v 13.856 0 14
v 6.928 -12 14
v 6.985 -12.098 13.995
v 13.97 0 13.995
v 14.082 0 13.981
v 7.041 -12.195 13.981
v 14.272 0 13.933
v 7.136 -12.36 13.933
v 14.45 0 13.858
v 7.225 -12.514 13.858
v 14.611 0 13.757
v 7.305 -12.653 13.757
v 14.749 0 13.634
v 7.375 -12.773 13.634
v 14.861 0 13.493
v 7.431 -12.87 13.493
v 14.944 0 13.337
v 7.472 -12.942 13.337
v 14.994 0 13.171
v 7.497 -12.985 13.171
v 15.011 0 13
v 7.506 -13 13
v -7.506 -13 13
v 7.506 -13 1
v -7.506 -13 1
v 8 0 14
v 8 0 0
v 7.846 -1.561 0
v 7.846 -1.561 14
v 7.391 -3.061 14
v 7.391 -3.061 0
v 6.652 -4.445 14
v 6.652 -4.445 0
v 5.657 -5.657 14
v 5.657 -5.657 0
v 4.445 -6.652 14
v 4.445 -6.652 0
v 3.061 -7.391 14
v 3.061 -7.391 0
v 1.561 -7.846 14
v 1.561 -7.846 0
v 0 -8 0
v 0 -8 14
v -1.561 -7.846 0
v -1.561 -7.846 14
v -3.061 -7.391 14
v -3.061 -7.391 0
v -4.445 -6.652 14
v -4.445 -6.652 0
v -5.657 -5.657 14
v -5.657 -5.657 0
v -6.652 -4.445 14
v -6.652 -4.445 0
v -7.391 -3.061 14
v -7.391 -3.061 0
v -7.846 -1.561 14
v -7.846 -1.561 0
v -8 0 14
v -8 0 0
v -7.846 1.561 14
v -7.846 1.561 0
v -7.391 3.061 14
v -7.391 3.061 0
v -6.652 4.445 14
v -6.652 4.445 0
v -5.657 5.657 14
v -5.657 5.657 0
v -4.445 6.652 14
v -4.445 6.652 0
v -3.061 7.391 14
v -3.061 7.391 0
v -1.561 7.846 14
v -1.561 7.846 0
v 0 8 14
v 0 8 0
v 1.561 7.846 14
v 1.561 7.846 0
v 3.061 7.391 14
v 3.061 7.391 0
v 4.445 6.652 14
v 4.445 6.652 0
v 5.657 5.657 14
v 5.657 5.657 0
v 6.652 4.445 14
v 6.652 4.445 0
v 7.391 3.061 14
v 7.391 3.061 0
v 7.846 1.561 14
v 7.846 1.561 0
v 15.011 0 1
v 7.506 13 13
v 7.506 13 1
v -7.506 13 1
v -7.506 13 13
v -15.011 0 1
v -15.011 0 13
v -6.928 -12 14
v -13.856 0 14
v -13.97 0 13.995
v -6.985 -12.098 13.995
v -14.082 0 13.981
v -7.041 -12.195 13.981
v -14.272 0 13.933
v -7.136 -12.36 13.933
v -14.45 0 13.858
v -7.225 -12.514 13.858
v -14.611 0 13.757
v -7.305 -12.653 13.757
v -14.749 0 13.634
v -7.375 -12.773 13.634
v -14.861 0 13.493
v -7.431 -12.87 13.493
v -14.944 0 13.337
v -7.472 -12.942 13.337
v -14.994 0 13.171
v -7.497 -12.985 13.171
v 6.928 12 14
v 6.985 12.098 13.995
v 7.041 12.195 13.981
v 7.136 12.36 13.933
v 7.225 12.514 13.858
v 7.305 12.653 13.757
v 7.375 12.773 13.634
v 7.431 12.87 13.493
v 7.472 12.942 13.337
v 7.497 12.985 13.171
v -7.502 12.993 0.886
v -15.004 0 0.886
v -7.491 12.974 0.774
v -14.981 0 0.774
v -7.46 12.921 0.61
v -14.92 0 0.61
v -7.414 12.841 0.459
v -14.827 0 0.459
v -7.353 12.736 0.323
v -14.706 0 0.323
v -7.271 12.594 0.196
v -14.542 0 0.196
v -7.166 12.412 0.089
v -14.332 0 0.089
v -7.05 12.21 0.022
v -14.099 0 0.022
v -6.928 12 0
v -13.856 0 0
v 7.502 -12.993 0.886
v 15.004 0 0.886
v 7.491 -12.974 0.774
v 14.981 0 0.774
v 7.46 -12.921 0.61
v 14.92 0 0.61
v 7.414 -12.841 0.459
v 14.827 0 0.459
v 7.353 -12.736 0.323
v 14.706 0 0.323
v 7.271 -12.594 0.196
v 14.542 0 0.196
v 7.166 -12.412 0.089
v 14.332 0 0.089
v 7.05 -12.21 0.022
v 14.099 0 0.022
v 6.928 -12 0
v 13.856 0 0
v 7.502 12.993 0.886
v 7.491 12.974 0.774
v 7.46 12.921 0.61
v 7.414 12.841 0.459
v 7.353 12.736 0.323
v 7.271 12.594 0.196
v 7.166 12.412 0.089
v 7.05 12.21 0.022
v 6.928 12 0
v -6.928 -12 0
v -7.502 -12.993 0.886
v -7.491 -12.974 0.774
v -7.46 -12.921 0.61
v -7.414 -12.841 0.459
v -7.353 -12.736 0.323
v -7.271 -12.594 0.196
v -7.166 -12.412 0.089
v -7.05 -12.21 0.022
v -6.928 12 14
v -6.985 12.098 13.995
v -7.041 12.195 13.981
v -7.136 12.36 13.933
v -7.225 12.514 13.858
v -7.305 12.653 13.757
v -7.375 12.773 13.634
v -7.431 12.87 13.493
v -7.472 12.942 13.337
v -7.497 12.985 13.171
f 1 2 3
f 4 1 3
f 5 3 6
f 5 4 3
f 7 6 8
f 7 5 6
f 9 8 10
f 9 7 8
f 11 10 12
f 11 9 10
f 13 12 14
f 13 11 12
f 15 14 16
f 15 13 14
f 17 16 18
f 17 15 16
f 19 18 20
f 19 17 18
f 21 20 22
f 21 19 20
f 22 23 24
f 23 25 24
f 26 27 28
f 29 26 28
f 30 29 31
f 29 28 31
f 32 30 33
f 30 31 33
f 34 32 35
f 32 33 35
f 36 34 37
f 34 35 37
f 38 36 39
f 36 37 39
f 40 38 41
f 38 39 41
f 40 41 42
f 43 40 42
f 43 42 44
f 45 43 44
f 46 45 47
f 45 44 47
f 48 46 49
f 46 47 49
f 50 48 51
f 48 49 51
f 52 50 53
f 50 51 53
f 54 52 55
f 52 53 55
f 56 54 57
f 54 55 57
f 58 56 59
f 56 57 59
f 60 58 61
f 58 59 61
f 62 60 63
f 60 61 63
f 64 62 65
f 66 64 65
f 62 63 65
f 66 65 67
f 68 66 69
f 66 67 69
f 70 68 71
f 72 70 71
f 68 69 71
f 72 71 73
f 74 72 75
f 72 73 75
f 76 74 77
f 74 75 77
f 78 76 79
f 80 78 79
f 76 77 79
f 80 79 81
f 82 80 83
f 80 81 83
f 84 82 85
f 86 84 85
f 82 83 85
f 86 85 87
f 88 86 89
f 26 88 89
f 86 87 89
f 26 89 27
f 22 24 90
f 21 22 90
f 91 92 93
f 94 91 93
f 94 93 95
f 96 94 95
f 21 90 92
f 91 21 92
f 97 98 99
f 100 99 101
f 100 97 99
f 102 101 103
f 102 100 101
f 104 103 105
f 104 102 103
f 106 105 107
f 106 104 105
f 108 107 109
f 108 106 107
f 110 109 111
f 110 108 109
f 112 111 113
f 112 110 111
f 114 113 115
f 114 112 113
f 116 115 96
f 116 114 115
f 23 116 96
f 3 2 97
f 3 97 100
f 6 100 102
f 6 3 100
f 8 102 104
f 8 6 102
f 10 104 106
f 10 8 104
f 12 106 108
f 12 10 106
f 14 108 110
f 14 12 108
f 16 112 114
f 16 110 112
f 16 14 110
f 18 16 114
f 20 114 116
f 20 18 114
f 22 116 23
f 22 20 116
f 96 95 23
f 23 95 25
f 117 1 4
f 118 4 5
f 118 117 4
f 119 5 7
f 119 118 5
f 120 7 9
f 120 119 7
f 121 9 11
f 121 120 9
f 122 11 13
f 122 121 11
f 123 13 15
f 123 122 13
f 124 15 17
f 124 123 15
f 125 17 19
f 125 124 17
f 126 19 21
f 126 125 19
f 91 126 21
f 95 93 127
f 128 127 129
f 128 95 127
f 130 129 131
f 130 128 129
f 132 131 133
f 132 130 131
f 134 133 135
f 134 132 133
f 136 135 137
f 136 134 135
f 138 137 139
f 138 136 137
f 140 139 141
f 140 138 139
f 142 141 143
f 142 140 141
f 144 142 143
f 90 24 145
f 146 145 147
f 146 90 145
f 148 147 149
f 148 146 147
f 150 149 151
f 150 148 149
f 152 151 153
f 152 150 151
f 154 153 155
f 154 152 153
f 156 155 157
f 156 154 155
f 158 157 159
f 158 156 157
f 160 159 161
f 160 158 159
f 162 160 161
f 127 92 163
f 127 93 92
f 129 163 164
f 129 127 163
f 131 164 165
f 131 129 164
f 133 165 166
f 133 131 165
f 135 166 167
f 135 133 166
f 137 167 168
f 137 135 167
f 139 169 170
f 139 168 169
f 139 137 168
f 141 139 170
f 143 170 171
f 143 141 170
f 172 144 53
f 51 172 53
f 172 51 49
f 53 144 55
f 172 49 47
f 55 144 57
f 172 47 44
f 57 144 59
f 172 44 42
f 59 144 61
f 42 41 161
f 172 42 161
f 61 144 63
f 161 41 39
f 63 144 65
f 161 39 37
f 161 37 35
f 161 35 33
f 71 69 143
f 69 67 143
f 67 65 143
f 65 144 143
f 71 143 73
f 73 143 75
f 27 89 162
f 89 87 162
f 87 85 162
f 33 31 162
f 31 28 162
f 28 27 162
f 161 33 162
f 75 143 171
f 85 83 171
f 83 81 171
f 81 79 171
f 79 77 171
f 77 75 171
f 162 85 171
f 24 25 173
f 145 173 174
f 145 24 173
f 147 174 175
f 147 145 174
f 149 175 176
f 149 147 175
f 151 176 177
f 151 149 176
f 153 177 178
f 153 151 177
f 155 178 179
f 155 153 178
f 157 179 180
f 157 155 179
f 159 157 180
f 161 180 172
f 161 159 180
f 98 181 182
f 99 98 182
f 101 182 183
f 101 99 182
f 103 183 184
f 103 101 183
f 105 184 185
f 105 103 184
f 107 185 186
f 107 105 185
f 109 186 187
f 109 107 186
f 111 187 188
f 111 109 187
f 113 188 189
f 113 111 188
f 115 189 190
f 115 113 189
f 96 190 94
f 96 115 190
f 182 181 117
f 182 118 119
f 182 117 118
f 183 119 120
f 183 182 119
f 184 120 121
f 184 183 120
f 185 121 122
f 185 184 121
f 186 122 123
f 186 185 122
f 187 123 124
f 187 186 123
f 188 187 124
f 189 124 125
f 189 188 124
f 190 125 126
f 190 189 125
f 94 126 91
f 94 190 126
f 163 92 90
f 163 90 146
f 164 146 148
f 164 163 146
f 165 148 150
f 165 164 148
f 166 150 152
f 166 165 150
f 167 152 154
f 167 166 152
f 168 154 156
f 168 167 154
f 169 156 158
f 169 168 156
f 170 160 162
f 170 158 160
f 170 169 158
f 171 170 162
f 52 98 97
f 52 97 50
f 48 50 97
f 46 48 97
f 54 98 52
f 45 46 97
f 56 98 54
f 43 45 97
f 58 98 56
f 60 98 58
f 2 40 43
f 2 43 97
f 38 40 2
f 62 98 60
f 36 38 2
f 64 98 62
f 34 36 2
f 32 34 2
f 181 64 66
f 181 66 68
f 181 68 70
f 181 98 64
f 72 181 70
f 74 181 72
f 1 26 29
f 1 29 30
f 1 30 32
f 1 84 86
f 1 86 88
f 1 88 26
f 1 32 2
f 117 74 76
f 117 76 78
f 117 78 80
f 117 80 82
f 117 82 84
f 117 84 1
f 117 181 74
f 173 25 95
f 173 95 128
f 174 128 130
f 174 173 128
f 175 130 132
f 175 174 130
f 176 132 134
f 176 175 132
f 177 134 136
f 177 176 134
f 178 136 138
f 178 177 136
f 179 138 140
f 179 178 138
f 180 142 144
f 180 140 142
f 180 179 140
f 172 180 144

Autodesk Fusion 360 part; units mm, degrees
sketch "Sketch1" plane through (0, 0, 0) normal (0, 0, 1) x (1, 0, 0)
  circle A0 centre (0, 0) radius 8
  line L0 (0, 0) -> (0, 8) construction
  line L1 (0, 0) -> (-8, 0) construction
  line L2 (0, 0) -> (8, 0) construction
  line L3 (0, 0) -> (0, -8) construction
  line L4 (-4.6188, 8) -> (-9.2376, 0) construction
  line L5 (-9.2376, 0) -> (-4.6188, -8) construction
  line L6 (-4.6188, -8) -> (4.6188, -8) construction
  line L7 (4.6188, -8) -> (9.2376, 0) construction
  line L8 (9.2376, 0) -> (4.6188, 8) construction
  line L9 (4.6188, 8) -> (-4.6188, 8) construction
  line L10 (-7.5056, -13) -> (7.5056, -13)
  line L11 (7.5056, -13) -> (15.0111, 0)
  line L12 (15.0111, 0) -> (7.5056, 13)
  line L13 (7.5056, 13) -> (-7.5056, 13)
  line L14 (-7.5056, 13) -> (-15.0111, 0)
  line L15 (-15.0111, 0) -> (-7.5056, -13)
  dimension "d1" = 16
  dimension "d4" = 5
extrude "Extrude3" add sketch "Sketch1" along normal blind 14 contours A0 | L10 L11 L12 L13 L14 L15
extrude "Extrude4" cut sketch "Sketch1" along normal through all contours A0
fillet "Fillet2" radius 1 12 edges at (0, 13, 14) (0, 13, 0) (11.2583, 6.5, 14) (11.2583, 6.5, 0) (11.2583, -6.5, 14) (11.2583, -6.5, 0) (-11.2583, 6.5, 14) (-11.2583, 6.5, 0) (-11.2583, -6.5, 0) (-11.2583, -6.5, 14) (0, -13, 0) (0, -13, 14)
thread "Thread2"
